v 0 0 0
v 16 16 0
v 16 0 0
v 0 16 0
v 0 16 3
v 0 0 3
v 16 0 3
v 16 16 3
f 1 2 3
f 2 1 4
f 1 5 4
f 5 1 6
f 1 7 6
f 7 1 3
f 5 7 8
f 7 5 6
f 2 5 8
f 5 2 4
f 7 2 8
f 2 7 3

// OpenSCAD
union() {
    translate([0, 0, 0]) color("brown") cube([1, 1, 1]);
    translate([0, 0, 1]) color("brown") cube([1, 1, 1]);
    translate([0, 0, 2]) color("brown") cube([1, 1, 1]);
    translate([0, 1, 0]) color("brown") cube([1, 1, 1]);
    translate([0, 1, 1]) color("brown") cube([1, 1, 1]);
    translate([0, 1, 2]) color("brown") cube([1, 1, 1]);
    translate([0, 2, 0]) color("brown") cube([1, 1, 1]);
    translate([0, 2, 1]) color("brown") cube([1, 1, 1]);
    translate([0, 2, 2]) color("brown") cube([1, 1, 1]);
    translate([0, 3, 0]) color("brown") cube([1, 1, 1]);
    translate([0, 3, 1]) color("brown") cube([1, 1, 1]);
    translate([0, 3, 2]) color("brown") cube([1, 1, 1]);
    translate([0, 4, 0]) color("brown") cube([1, 1, 1]);
    translate([0, 4, 1]) color("brown") cube([1, 1, 1]);
    translate([0, 4, 2]) color("brown") cube([1, 1, 1]);
    translate([0, 5, 0]) color("brown") cube([1, 1, 1]);
    translate([0, 5, 1]) color("brown") cube([1, 1, 1]);
    translate([0, 5, 2]) color("brown") cube([1, 1, 1]);
    translate([0, 6, 0]) color("brown") cube([1, 1, 1]);
    translate([0, 6, 1]) color("brown") cube([1, 1, 1]);
    translate([0, 6, 2]) color("brown") cube([1, 1, 1]);
    translate([0, 7, 0]) color("brown") cube([1, 1, 1]);
    translate([0, 7, 1]) color("brown") cube([1, 1, 1]);
    translate([0, 7, 2]) color("brown") cube([1, 1, 1]);
    translate([0, 8, 0]) color("brown") cube([1, 1, 1]);
    translate([0, 8, 1]) color("brown") cube([1, 1, 1]);
    translate([0, 8, 2]) color("brown") cube([1, 1, 1]);
    translate([0, 9, 0]) color("brown") cube([1, 1, 1]);
    translate([0, 9, 1]) color("brown") cube([1, 1, 1]);
    translate([0, 9, 2]) color("brown") cube([1, 1, 1]);
    translate([0, 10, 0]) color("brown") cube([1, 1, 1]);
    translate([0, 10, 1]) color("brown") cube([1, 1, 1]);
    translate([0, 10, 2]) color("brown") cube([1, 1, 1]);
    translate([0, 11, 0]) color("brown") cube([1, 1, 1]);
    translate([0, 11, 1]) color("brown") cube([1, 1, 1]);
    translate([0, 11, 2]) color("brown") cube([1, 1, 1]);
    translate([0, 12, 0]) color("brown") cube([1, 1, 1]);
    translate([0, 12, 1]) color("brown") cube([1, 1, 1]);
    translate([0, 12, 2]) color("brown") cube([1, 1, 1]);
    translate([0, 13, 0]) color("brown") cube([1, 1, 1]);
    translate([0, 13, 1]) color("brown") cube([1, 1, 1]);
    translate([0, 13, 2]) color("brown") cube([1, 1, 1]);
    translate([0, 14, 0]) color("brown") cube([1, 1, 1]);
    translate([0, 14, 1]) color("brown") cube([1, 1, 1]);
    translate([0, 14, 2]) color("brown") cube([1, 1, 1]);
    translate([0, 15, 0]) color("brown") cube([1, 1, 1]);
    translate([0, 15, 1]) color("brown") cube([1, 1, 1]);
    translate([0, 15, 2]) color("brown") cube([1, 1, 1]);
    translate([1, 0, 0]) color("brown") cube([1, 1, 1]);
    translate([1, 0, 1]) color("brown") cube([1, 1, 1]);
    translate([1, 0, 2]) color("brown") cube([1, 1, 1]);
    translate([1, 1, 0]) color("brown") cube([1, 1, 1]);
    translate([1, 1, 1]) color("brown") cube([1, 1, 1]);
    translate([1, 1, 2]) color("brown") cube([1, 1, 1]);
    translate([1, 2, 0]) color("brown") cube([1, 1, 1]);
    translate([1, 2, 1]) color("brown") cube([1, 1, 1]);
    translate([1, 2, 2]) color("brown") cube([1, 1, 1]);
    translate([1, 3, 0]) color("brown") cube([1, 1, 1]);
    translate([1, 3, 1]) color("brown") cube([1, 1, 1]);
    translate([1, 3, 2]) color("brown") cube([1, 1, 1]);
    translate([1, 4, 0]) color("brown") cube([1, 1, 1]);
    translate([1, 4, 1]) color("brown") cube([1, 1, 1]);
    translate([1, 4, 2]) color("brown") cube([1, 1, 1]);
    translate([1, 5, 0]) color("brown") cube([1, 1, 1]);
    translate([1, 5, 1]) color("brown") cube([1, 1, 1]);
    translate([1, 5, 2]) color("brown") cube([1, 1, 1]);
    translate([1, 6, 0]) color("brown") cube([1, 1, 1]);
    translate([1, 6, 1]) color("brown") cube([1, 1, 1]);
    translate([1, 6, 2]) color("brown") cube([1, 1, 1]);
    translate([1, 7, 0]) color("brown") cube([1, 1, 1]);
    translate([1, 7, 1]) color("brown") cube([1, 1, 1]);
    translate([1, 7, 2]) color("brown") cube([1, 1, 1]);
    translate([1, 8, 0]) color("brown") cube([1, 1, 1]);
    translate([1, 8, 1]) color("brown") cube([1, 1, 1]);
    translate([1, 8, 2]) color("brown") cube([1, 1, 1]);
    translate([1, 9, 0]) color("brown") cube([1, 1, 1]);
    translate([1, 9, 1]) color("brown") cube([1, 1, 1]);
    translate([1, 9, 2]) color("brown") cube([1, 1, 1]);
    translate([1, 10, 0]) color("brown") cube([1, 1, 1]);
    translate([1, 10, 1]) color("brown") cube([1, 1, 1]);
    translate([1, 10, 2]) color("brown") cube([1, 1, 1]);
    translate([1, 11, 0]) color("brown") cube([1, 1, 1]);
    translate([1, 11, 1]) color("brown") cube([1, 1, 1]);
    translate([1, 11, 2]) color("brown") cube([1, 1, 1]);
    translate([1, 12, 0]) color("brown") cube([1, 1, 1]);
    translate([1, 12, 1]) color("brown") cube([1, 1, 1]);
    translate([1, 12, 2]) color("brown") cube([1, 1, 1]);
    translate([1, 13, 0]) color("brown") cube([1, 1, 1]);
    translate([1, 13, 1]) color("brown") cube([1, 1, 1]);
    translate([1, 13, 2]) color("brown") cube([1, 1, 1]);
    translate([1, 14, 0]) color("brown") cube([1, 1, 1]);
    translate([1, 14, 1]) color("brown") cube([1, 1, 1]);
    translate([1, 14, 2]) color("brown") cube([1, 1, 1]);
    translate([1, 15, 0]) color("brown") cube([1, 1, 1]);
    translate([1, 15, 1]) color("brown") cube([1, 1, 1]);
    translate([1, 15, 2]) color("brown") cube([1, 1, 1]);
    translate([2, 0, 0]) color("brown") cube([1, 1, 1]);
    translate([2, 0, 1]) color("brown") cube([1, 1, 1]);
    translate([2, 0, 2]) color("brown") cube([1, 1, 1]);
    translate([2, 1, 0]) color("brown") cube([1, 1, 1]);
    translate([2, 1, 1]) color("brown") cube([1, 1, 1]);
    translate([2, 1, 2]) color("brown") cube([1, 1, 1]);
    translate([2, 2, 0]) color("brown") cube([1, 1, 1]);
    translate([2, 2, 1]) color("brown") cube([1, 1, 1]);
    translate([2, 2, 2]) color("brown") cube([1, 1, 1]);
    translate([2, 3, 0]) color("brown") cube([1, 1, 1]);
    translate([2, 3, 1]) color("brown") cube([1, 1, 1]);
    translate([2, 3, 2]) color("brown") cube([1, 1, 1]);
    translate([2, 4, 0]) color("brown") cube([1, 1, 1]);
    translate([2, 4, 1]) color("brown") cube([1, 1, 1]);
    translate([2, 4, 2]) color("brown") cube([1, 1, 1]);
    translate([2, 5, 0]) color("brown") cube([1, 1, 1]);
    translate([2, 5, 1]) color("brown") cube([1, 1, 1]);
    translate([2, 5, 2]) color("brown") cube([1, 1, 1]);
    translate([2, 6, 0]) color("brown") cube([1, 1, 1]);
    translate([2, 6, 1]) color("brown") cube([1, 1, 1]);
    translate([2, 6, 2]) color("brown") cube([1, 1, 1]);
    translate([2, 7, 0]) color("brown") cube([1, 1, 1]);
    translate([2, 7, 1]) color("brown") cube([1, 1, 1]);
    translate([2, 7, 2]) color("brown") cube([1, 1, 1]);
    translate([2, 8, 0]) color("brown") cube([1, 1, 1]);
    translate([2, 8, 1]) color("brown") cube([1, 1, 1]);
    translate([2, 8, 2]) color("brown") cube([1, 1, 1]);
    translate([2, 9, 0]) color("brown") cube([1, 1, 1]);
    translate([2, 9, 1]) color("brown") cube([1, 1, 1]);
    translate([2, 9, 2]) color("brown") cube([1, 1, 1]);
    translate([2, 10, 0]) color("brown") cube([1, 1, 1]);
    translate([2, 10, 1]) color("brown") cube([1, 1, 1]);
    translate([2, 10, 2]) color("brown") cube([1, 1, 1]);
    translate([2, 11, 0]) color("brown") cube([1, 1, 1]);
    translate([2, 11, 1]) color("brown") cube([1, 1, 1]);
    translate([2, 11, 2]) color("brown") cube([1, 1, 1]);
    translate([2, 12, 0]) color("brown") cube([1, 1, 1]);
    translate([2, 12, 1]) color("brown") cube([1, 1, 1]);
    translate([2, 12, 2]) color("brown") cube([1, 1, 1]);
    translate([2, 13, 0]) color("brown") cube([1, 1, 1]);
    translate([2, 13, 1]) color("brown") cube([1, 1, 1]);
    translate([2, 13, 2]) color("brown") cube([1, 1, 1]);
    translate([2, 14, 0]) color("brown") cube([1, 1, 1]);
    translate([2, 14, 1]) color("brown") cube([1, 1, 1]);
    translate([2, 14, 2]) color("brown") cube([1, 1, 1]);
    translate([2, 15, 0]) color("brown") cube([1, 1, 1]);
    translate([2, 15, 1]) color("brown") cube([1, 1, 1]);
    translate([2, 15, 2]) color("brown") cube([1, 1, 1]);
    translate([3, 0, 0]) color("brown") cube([1, 1, 1]);
    translate([3, 0, 1]) color("brown") cube([1, 1, 1]);
    translate([3, 0, 2]) color("brown") cube([1, 1, 1]);
    translate([3, 1, 0]) color("brown") cube([1, 1, 1]);
    translate([3, 1, 1]) color("brown") cube([1, 1, 1]);
    translate([3, 1, 2]) color("brown") cube([1, 1, 1]);
    translate([3, 2, 0]) color("brown") cube([1, 1, 1]);
    translate([3, 2, 1]) color("brown") cube([1, 1, 1]);
    translate([3, 2, 2]) color("brown") cube([1, 1, 1]);
    translate([3, 3, 0]) color("brown") cube([1, 1, 1]);
    translate([3, 3, 1]) color("brown") cube([1, 1, 1]);
    translate([3, 3, 2]) color("brown") cube([1, 1, 1]);
    translate([3, 4, 0]) color("brown") cube([1, 1, 1]);
    translate([3, 4, 1]) color("brown") cube([1, 1, 1]);
    translate([3, 4, 2]) color("brown") cube([1, 1, 1]);
    translate([3, 5, 0]) color("brown") cube([1, 1, 1]);
    translate([3, 5, 1]) color("brown") cube([1, 1, 1]);
    translate([3, 5, 2]) color("brown") cube([1, 1, 1]);
    translate([3, 6, 0]) color("brown") cube([1, 1, 1]);
    translate([3, 6, 1]) color("brown") cube([1, 1, 1]);
    translate([3, 6, 2]) color("brown") cube([1, 1, 1]);
    translate([3, 7, 0]) color("brown") cube([1, 1, 1]);
    translate([3, 7, 1]) color("brown") cube([1, 1, 1]);
    translate([3, 7, 2]) color("brown") cube([1, 1, 1]);
    translate([3, 8, 0]) color("brown") cube([1, 1, 1]);
    translate([3, 8, 1]) color("brown") cube([1, 1, 1]);
    translate([3, 8, 2]) color("brown") cube([1, 1, 1]);
    translate([3, 9, 0]) color("brown") cube([1, 1, 1]);
    translate([3, 9, 1]) color("brown") cube([1, 1, 1]);
    translate([3, 9, 2]) color("brown") cube([1, 1, 1]);
    translate([3, 10, 0]) color("brown") cube([1, 1, 1]);
    translate([3, 10, 1]) color("brown") cube([1, 1, 1]);
    translate([3, 10, 2]) color("brown") cube([1, 1, 1]);
    translate([3, 11, 0]) color("brown") cube([1, 1, 1]);
    translate([3, 11, 1]) color("brown") cube([1, 1, 1]);
    translate([3, 11, 2]) color("brown") cube([1, 1, 1]);
    translate([3, 12, 0]) color("brown") cube([1, 1, 1]);
    translate([3, 12, 1]) color("brown") cube([1, 1, 1]);
    translate([3, 12, 2]) color("brown") cube([1, 1, 1]);
    translate([3, 13, 0]) color("brown") cube([1, 1, 1]);
    translate([3, 13, 1]) color("brown") cube([1, 1, 1]);
    translate([3, 13, 2]) color("brown") cube([1, 1, 1]);
    translate([3, 14, 0]) color("brown") cube([1, 1, 1]);
    translate([3, 14, 1]) color("brown") cube([1, 1, 1]);
    translate([3, 14, 2]) color("brown") cube([1, 1, 1]);
    translate([3, 15, 0]) color("brown") cube([1, 1, 1]);
    translate([3, 15, 1]) color("brown") cube([1, 1, 1]);
    translate([3, 15, 2]) color("brown") cube([1, 1, 1]);
    translate([4, 0, 0]) color("brown") cube([1, 1, 1]);
    translate([4, 0, 1]) color("brown") cube([1, 1, 1]);
    translate([4, 0, 2]) color("brown") cube([1, 1, 1]);
    translate([4, 1, 0]) color("brown") cube([1, 1, 1]);
    translate([4, 1, 1]) color("brown") cube([1, 1, 1]);
    translate([4, 1, 2]) color("brown") cube([1, 1, 1]);
    translate([4, 2, 0]) color("brown") cube([1, 1, 1]);
    translate([4, 2, 1]) color("brown") cube([1, 1, 1]);
    translate([4, 2, 2]) color("brown") cube([1, 1, 1]);
    translate([4, 3, 0]) color("brown") cube([1, 1, 1]);
    translate([4, 3, 1]) color("brown") cube([1, 1, 1]);
    translate([4, 3, 2]) color("brown") cube([1, 1, 1]);
    translate([4, 4, 0]) color("brown") cube([1, 1, 1]);
    translate([4, 4, 1]) color("brown") cube([1, 1, 1]);
    translate([4, 4, 2]) color("blue") cube([1, 1, 1]);
    translate([4, 5, 0]) color("brown") cube([1, 1, 1]);
    translate([4, 5, 1]) color("brown") cube([1, 1, 1]);
    translate([4, 5, 2]) color("brown") cube([1, 1, 1]);
    translate([4, 6, 0]) color("brown") cube([1, 1, 1]);
    translate([4, 6, 1]) color("brown") cube([1, 1, 1]);
    translate([4, 6, 2]) color("brown") cube([1, 1, 1]);
    translate([4, 7, 0]) color("brown") cube([1, 1, 1]);
    translate([4, 7, 1]) color("brown") cube([1, 1, 1]);
    translate([4, 7, 2]) color("brown") cube([1, 1, 1]);
    translate([4, 8, 0]) color("brown") cube([1, 1, 1]);
    translate([4, 8, 1]) color("brown") cube([1, 1, 1]);
    translate([4, 8, 2]) color("brown") cube([1, 1, 1]);
    translate([4, 9, 0]) color("brown") cube([1, 1, 1]);
    translate([4, 9, 1]) color("brown") cube([1, 1, 1]);
    translate([4, 9, 2]) color("brown") cube([1, 1, 1]);
    translate([4, 10, 0]) color("brown") cube([1, 1, 1]);
    translate([4, 10, 1]) color("brown") cube([1, 1, 1]);
    translate([4, 10, 2]) color("brown") cube([1, 1, 1]);
    translate([4, 11, 0]) color("brown") cube([1, 1, 1]);
    translate([4, 11, 1]) color("brown") cube([1, 1, 1]);
    translate([4, 11, 2]) color("brown") cube([1, 1, 1]);
    translate([4, 12, 0]) color("brown") cube([1, 1, 1]);
    translate([4, 12, 1]) color("brown") cube([1, 1, 1]);
    translate([4, 12, 2]) color("brown") cube([1, 1, 1]);
    translate([4, 13, 0]) color("brown") cube([1, 1, 1]);
    translate([4, 13, 1]) color("brown") cube([1, 1, 1]);
    translate([4, 13, 2]) color("brown") cube([1, 1, 1]);
    translate([4, 14, 0]) color("brown") cube([1, 1, 1]);
    translate([4, 14, 1]) color("brown") cube([1, 1, 1]);
    translate([4, 14, 2]) color("brown") cube([1, 1, 1]);
    translate([4, 15, 0]) color("brown") cube([1, 1, 1]);
    translate([4, 15, 1]) color("brown") cube([1, 1, 1]);
    translate([4, 15, 2]) color("brown") cube([1, 1, 1]);
    translate([5, 0, 0]) color("brown") cube([1, 1, 1]);
    translate([5, 0, 1]) color("brown") cube([1, 1, 1]);
    translate([5, 0, 2]) color("brown") cube([1, 1, 1]);
    translate([5, 1, 0]) color("brown") cube([1, 1, 1]);
    translate([5, 1, 1]) color("brown") cube([1, 1, 1]);
    translate([5, 1, 2]) color("brown") cube([1, 1, 1]);
    translate([5, 2, 0]) color("brown") cube([1, 1, 1]);
    translate([5, 2, 1]) color("brown") cube([1, 1, 1]);
    translate([5, 2, 2]) color("brown") cube([1, 1, 1]);
    translate([5, 3, 0]) color("brown") cube([1, 1, 1]);
    translate([5, 3, 1]) color("brown") cube([1, 1, 1]);
    translate([5, 3, 2]) color("brown") cube([1, 1, 1]);
    translate([5, 4, 0]) color("brown") cube([1, 1, 1]);
    translate([5, 4, 1]) color("brown") cube([1, 1, 1]);
    translate([5, 4, 2]) color("brown") cube([1, 1, 1]);
    translate([5, 5, 0]) color("brown") cube([1, 1, 1]);
    translate([5, 5, 1]) color("brown") cube([1, 1, 1]);
    translate([5, 5, 2]) color("brown") cube([1, 1, 1]);
    translate([5, 6, 0]) color("brown") cube([1, 1, 1]);
    translate([5, 6, 1]) color("brown") cube([1, 1, 1]);
    translate([5, 6, 2]) color("brown") cube([1, 1, 1]);
    translate([5, 7, 0]) color("brown") cube([1, 1, 1]);
    translate([5, 7, 1]) color("brown") cube([1, 1, 1]);
    translate([5, 7, 2]) color("brown") cube([1, 1, 1]);
    translate([5, 8, 0]) color("brown") cube([1, 1, 1]);
    translate([5, 8, 1]) color("brown") cube([1, 1, 1]);
    translate([5, 8, 2]) color("brown") cube([1, 1, 1]);
    translate([5, 9, 0]) color("brown") cube([1, 1, 1]);
    translate([5, 9, 1]) color("brown") cube([1, 1, 1]);
    translate([5, 9, 2]) color("brown") cube([1, 1, 1]);
    translate([5, 10, 0]) color("brown") cube([1, 1, 1]);
    translate([5, 10, 1]) color("brown") cube([1, 1, 1]);
    translate([5, 10, 2]) color("brown") cube([1, 1, 1]);
    translate([5, 11, 0]) color("brown") cube([1, 1, 1]);
    translate([5, 11, 1]) color("brown") cube([1, 1, 1]);
    translate([5, 11, 2]) color("brown") cube([1, 1, 1]);
    translate([5, 12, 0]) color("brown") cube([1, 1, 1]);
    translate([5, 12, 1]) color("brown") cube([1, 1, 1]);
    translate([5, 12, 2]) color("brown") cube([1, 1, 1]);
    translate([5, 13, 0]) color("brown") cube([1, 1, 1]);
    translate([5, 13, 1]) color("brown") cube([1, 1, 1]);
    translate([5, 13, 2]) color("brown") cube([1, 1, 1]);
    translate([5, 14, 0]) color("brown") cube([1, 1, 1]);
    translate([5, 14, 1]) color("brown") cube([1, 1, 1]);
    translate([5, 14, 2]) color("brown") cube([1, 1, 1]);
    translate([5, 15, 0]) color("brown") cube([1, 1, 1]);
    translate([5, 15, 1]) color("brown") cube([1, 1, 1]);
    translate([5, 15, 2]) color("brown") cube([1, 1, 1]);
    translate([6, 0, 0]) color("brown") cube([1, 1, 1]);
    translate([6, 0, 1]) color("brown") cube([1, 1, 1]);
    translate([6, 0, 2]) color("brown") cube([1, 1, 1]);
    translate([6, 1, 0]) color("brown") cube([1, 1, 1]);
    translate([6, 1, 1]) color("brown") cube([1, 1, 1]);
    translate([6, 1, 2]) color("brown") cube([1, 1, 1]);
    translate([6, 2, 0]) color("brown") cube([1, 1, 1]);
    translate([6, 2, 1]) color("brown") cube([1, 1, 1]);
    translate([6, 2, 2]) color("brown") cube([1, 1, 1]);
    translate([6, 3, 0]) color("brown") cube([1, 1, 1]);
    translate([6, 3, 1]) color("brown") cube([1, 1, 1]);
    translate([6, 3, 2]) color("brown") cube([1, 1, 1]);
    translate([6, 4, 0]) color("brown") cube([1, 1, 1]);
    translate([6, 4, 1]) color("brown") cube([1, 1, 1]);
    translate([6, 4, 2]) color("brown") cube([1, 1, 1]);
    translate([6, 5, 0]) color("brown") cube([1, 1, 1]);
    translate([6, 5, 1]) color("brown") cube([1, 1, 1]);
    translate([6, 5, 2]) color("brown") cube([1, 1, 1]);
    translate([6, 6, 0]) color("brown") cube([1, 1, 1]);
    translate([6, 6, 1]) color("brown") cube([1, 1, 1]);
    translate([6, 6, 2]) color("brown") cube([1, 1, 1]);
    translate([6, 7, 0]) color("brown") cube([1, 1, 1]);
    translate([6, 7, 1]) color("brown") cube([1, 1, 1]);
    translate([6, 7, 2]) color("brown") cube([1, 1, 1]);
    translate([6, 8, 0]) color("brown") cube([1, 1, 1]);
    translate([6, 8, 1]) color("brown") cube([1, 1, 1]);
    translate([6, 8, 2]) color("brown") cube([1, 1, 1]);
    translate([6, 9, 0]) color("brown") cube([1, 1, 1]);
    translate([6, 9, 1]) color("brown") cube([1, 1, 1]);
    translate([6, 9, 2]) color("brown") cube([1, 1, 1]);
    translate([6, 10, 0]) color("brown") cube([1, 1, 1]);
    translate([6, 10, 1]) color("brown") cube([1, 1, 1]);
    translate([6, 10, 2]) color("brown") cube([1, 1, 1]);
    translate([6, 11, 0]) color("brown") cube([1, 1, 1]);
    translate([6, 11, 1]) color("brown") cube([1, 1, 1]);
    translate([6, 11, 2]) color("brown") cube([1, 1, 1]);
    translate([6, 12, 0]) color("brown") cube([1, 1, 1]);
    translate([6, 12, 1]) color("brown") cube([1, 1, 1]);
    translate([6, 12, 2]) color("brown") cube([1, 1, 1]);
    translate([6, 13, 0]) color("brown") cube([1, 1, 1]);
    translate([6, 13, 1]) color("brown") cube([1, 1, 1]);
    translate([6, 13, 2]) color("brown") cube([1, 1, 1]);
    translate([6, 14, 0]) color("brown") cube([1, 1, 1]);
    translate([6, 14, 1]) color("brown") cube([1, 1, 1]);
    translate([6, 14, 2]) color("brown") cube([1, 1, 1]);
    translate([6, 15, 0]) color("brown") cube([1, 1, 1]);
    translate([6, 15, 1]) color("brown") cube([1, 1, 1]);
    translate([6, 15, 2]) color("brown") cube([1, 1, 1]);
    translate([7, 0, 0]) color("brown") cube([1, 1, 1]);
    translate([7, 0, 1]) color("brown") cube([1, 1, 1]);
    translate([7, 0, 2]) color("brown") cube([1, 1, 1]);
    translate([7, 1, 0]) color("brown") cube([1, 1, 1]);
    translate([7, 1, 1]) color("brown") cube([1, 1, 1]);
    translate([7, 1, 2]) color("brown") cube([1, 1, 1]);
    translate([7, 2, 0]) color("brown") cube([1, 1, 1]);
    translate([7, 2, 1]) color("brown") cube([1, 1, 1]);
    translate([7, 2, 2]) color("brown") cube([1, 1, 1]);
    translate([7, 3, 0]) color("brown") cube([1, 1, 1]);
    translate([7, 3, 1]) color("brown") cube([1, 1, 1]);
    translate([7, 3, 2]) color("brown") cube([1, 1, 1]);
    translate([7, 4, 0]) color("brown") cube([1, 1, 1]);
    translate([7, 4, 1]) color("brown") cube([1, 1, 1]);
    translate([7, 4, 2]) color("brown") cube([1, 1, 1]);
    translate([7, 5, 0]) color("brown") cube([1, 1, 1]);
    translate([7, 5, 1]) color("brown") cube([1, 1, 1]);
    translate([7, 5, 2]) color("brown") cube([1, 1, 1]);
    translate([7, 6, 0]) color("brown") cube([1, 1, 1]);
    translate([7, 6, 1]) color("brown") cube([1, 1, 1]);
    translate([7, 6, 2]) color("brown") cube([1, 1, 1]);
    translate([7, 7, 0]) color("brown") cube([1, 1, 1]);
    translate([7, 7, 1]) color("brown") cube([1, 1, 1]);
    translate([7, 7, 2]) color("brown") cube([1, 1, 1]);
    translate([7, 8, 0]) color("brown") cube([1, 1, 1]);
    translate([7, 8, 1]) color("brown") cube([1, 1, 1]);
    translate([7, 8, 2]) color("brown") cube([1, 1, 1]);
    translate([7, 9, 0]) color("brown") cube([1, 1, 1]);
    translate([7, 9, 1]) color("brown") cube([1, 1, 1]);
    translate([7, 9, 2]) color("brown") cube([1, 1, 1]);
    translate([7, 10, 0]) color("brown") cube([1, 1, 1]);
    translate([7, 10, 1]) color("brown") cube([1, 1, 1]);
    translate([7, 10, 2]) color("brown") cube([1, 1, 1]);
    translate([7, 11, 0]) color("brown") cube([1, 1, 1]);
    translate([7, 11, 1]) color("brown") cube([1, 1, 1]);
    translate([7, 11, 2]) color("brown") cube([1, 1, 1]);
    translate([7, 12, 0]) color("brown") cube([1, 1, 1]);
    translate([7, 12, 1]) color("brown") cube([1, 1, 1]);
    translate([7, 12, 2]) color("brown") cube([1, 1, 1]);
    translate([7, 13, 0]) color("brown") cube([1, 1, 1]);
    translate([7, 13, 1]) color("brown") cube([1, 1, 1]);
    translate([7, 13, 2]) color("brown") cube([1, 1, 1]);
    translate([7, 14, 0]) color("brown") cube([1, 1, 1]);
    translate([7, 14, 1]) color("brown") cube([1, 1, 1]);
    translate([7, 14, 2]) color("brown") cube([1, 1, 1]);
    translate([7, 15, 0]) color("brown") cube([1, 1, 1]);
    translate([7, 15, 1]) color("brown") cube([1, 1, 1]);
    translate([7, 15, 2]) color("brown") cube([1, 1, 1]);
    translate([8, 0, 0]) color("brown") cube([1, 1, 1]);
    translate([8, 0, 1]) color("brown") cube([1, 1, 1]);
    translate([8, 0, 2]) color("brown") cube([1, 1, 1]);
    translate([8, 1, 0]) color("brown") cube([1, 1, 1]);
    translate([8, 1, 1]) color("brown") cube([1, 1, 1]);
    translate([8, 1, 2]) color("brown") cube([1, 1, 1]);
    translate([8, 2, 0]) color("brown") cube([1, 1, 1]);
    translate([8, 2, 1]) color("brown") cube([1, 1, 1]);
    translate([8, 2, 2]) color("brown") cube([1, 1, 1]);
    translate([8, 3, 0]) color("brown") cube([1, 1, 1]);
    translate([8, 3, 1]) color("brown") cube([1, 1, 1]);
    translate([8, 3, 2]) color("brown") cube([1, 1, 1]);
    translate([8, 4, 0]) color("brown") cube([1, 1, 1]);
    translate([8, 4, 1]) color("brown") cube([1, 1, 1]);
    translate([8, 4, 2]) color("brown") cube([1, 1, 1]);
    translate([8, 5, 0]) color("brown") cube([1, 1, 1]);
    translate([8, 5, 1]) color("brown") cube([1, 1, 1]);
    translate([8, 5, 2]) color("brown") cube([1, 1, 1]);
    translate([8, 6, 0]) color("brown") cube([1, 1, 1]);
    translate([8, 6, 1]) color("brown") cube([1, 1, 1]);
    translate([8, 6, 2]) color("brown") cube([1, 1, 1]);
    translate([8, 7, 0]) color("brown") cube([1, 1, 1]);
    translate([8, 7, 1]) color("brown") cube([1, 1, 1]);
    translate([8, 7, 2]) color("brown") cube([1, 1, 1]);
    translate([8, 8, 0]) color("brown") cube([1, 1, 1]);
    translate([8, 8, 1]) color("brown") cube([1, 1, 1]);
    translate([8, 8, 2]) color("brown") cube([1, 1, 1]);
    translate([8, 9, 0]) color("brown") cube([1, 1, 1]);
    translate([8, 9, 1]) color("brown") cube([1, 1, 1]);
    translate([8, 9, 2]) color("brown") cube([1, 1, 1]);
    translate([8, 10, 0]) color("brown") cube([1, 1, 1]);
    translate([8, 10, 1]) color("brown") cube([1, 1, 1]);
    translate([8, 10, 2]) color("brown") cube([1, 1, 1]);
    translate([8, 11, 0]) color("brown") cube([1, 1, 1]);
    translate([8, 11, 1]) color("brown") cube([1, 1, 1]);
    translate([8, 11, 2]) color("brown") cube([1, 1, 1]);
    translate([8, 12, 0]) color("brown") cube([1, 1, 1]);
    translate([8, 12, 1]) color("brown") cube([1, 1, 1]);
    translate([8, 12, 2]) color("brown") cube([1, 1, 1]);
    translate([8, 13, 0]) color("brown") cube([1, 1, 1]);
    translate([8, 13, 1]) color("brown") cube([1, 1, 1]);
    translate([8, 13, 2]) color("brown") cube([1, 1, 1]);
    translate([8, 14, 0]) color("brown") cube([1, 1, 1]);
    translate([8, 14, 1]) color("brown") cube([1, 1, 1]);
    translate([8, 14, 2]) color("brown") cube([1, 1, 1]);
    translate([8, 15, 0]) color("brown") cube([1, 1, 1]);
    translate([8, 15, 1]) color("brown") cube([1, 1, 1]);
    translate([8, 15, 2]) color("brown") cube([1, 1, 1]);
    translate([9, 0, 0]) color("brown") cube([1, 1, 1]);
    translate([9, 0, 1]) color("brown") cube([1, 1, 1]);
    translate([9, 0, 2]) color("brown") cube([1, 1, 1]);
    translate([9, 1, 0]) color("brown") cube([1, 1, 1]);
    translate([9, 1, 1]) color("brown") cube([1, 1, 1]);
    translate([9, 1, 2]) color("brown") cube([1, 1, 1]);
    translate([9, 2, 0]) color("brown") cube([1, 1, 1]);
    translate([9, 2, 1]) color("brown") cube([1, 1, 1]);
    translate([9, 2, 2]) color("brown") cube([1, 1, 1]);
    translate([9, 3, 0]) color("brown") cube([1, 1, 1]);
    translate([9, 3, 1]) color("brown") cube([1, 1, 1]);
    translate([9, 3, 2]) color("brown") cube([1, 1, 1]);
    translate([9, 4, 0]) color("brown") cube([1, 1, 1]);
    translate([9, 4, 1]) color("brown") cube([1, 1, 1]);
    translate([9, 4, 2]) color("brown") cube([1, 1, 1]);
    translate([9, 5, 0]) color("brown") cube([1, 1, 1]);
    translate([9, 5, 1]) color("brown") cube([1, 1, 1]);
    translate([9, 5, 2]) color("brown") cube([1, 1, 1]);
    translate([9, 6, 0]) color("brown") cube([1, 1, 1]);
    translate([9, 6, 1]) color("brown") cube([1, 1, 1]);
    translate([9, 6, 2]) color("brown") cube([1, 1, 1]);
    translate([9, 7, 0]) color("brown") cube([1, 1, 1]);
    translate([9, 7, 1]) color("brown") cube([1, 1, 1]);
    translate([9, 7, 2]) color("brown") cube([1, 1, 1]);
    translate([9, 8, 0]) color("brown") cube([1, 1, 1]);
    translate([9, 8, 1]) color("brown") cube([1, 1, 1]);
    translate([9, 8, 2]) color("brown") cube([1, 1, 1]);
    translate([9, 9, 0]) color("brown") cube([1, 1, 1]);
    translate([9, 9, 1]) color("brown") cube([1, 1, 1]);
    translate([9, 9, 2]) color("brown") cube([1, 1, 1]);
    translate([9, 10, 0]) color("brown") cube([1, 1, 1]);
    translate([9, 10, 1]) color("brown") cube([1, 1, 1]);
    translate([9, 10, 2]) color("brown") cube([1, 1, 1]);
    translate([9, 11, 0]) color("brown") cube([1, 1, 1]);
    translate([9, 11, 1]) color("brown") cube([1, 1, 1]);
    translate([9, 11, 2]) color("brown") cube([1, 1, 1]);
    translate([9, 12, 0]) color("brown") cube([1, 1, 1]);
    translate([9, 12, 1]) color("brown") cube([1, 1, 1]);
    translate([9, 12, 2]) color("brown") cube([1, 1, 1]);
    translate([9, 13, 0]) color("brown") cube([1, 1, 1]);
    translate([9, 13, 1]) color("brown") cube([1, 1, 1]);
    translate([9, 13, 2]) color("brown") cube([1, 1, 1]);
    translate([9, 14, 0]) color("brown") cube([1, 1, 1]);
    translate([9, 14, 1]) color("brown") cube([1, 1, 1]);
    translate([9, 14, 2]) color("brown") cube([1, 1, 1]);
    translate([9, 15, 0]) color("brown") cube([1, 1, 1]);
    translate([9, 15, 1]) color("brown") cube([1, 1, 1]);
    translate([9, 15, 2]) color("brown") cube([1, 1, 1]);
    translate([10, 0, 0]) color("brown") cube([1, 1, 1]);
    translate([10, 0, 1]) color("brown") cube([1, 1, 1]);
    translate([10, 0, 2]) color("brown") cube([1, 1, 1]);
    translate([10, 1, 0]) color("brown") cube([1, 1, 1]);
    translate([10, 1, 1]) color("brown") cube([1, 1, 1]);
    translate([10, 1, 2]) color("brown") cube([1, 1, 1]);
    translate([10, 2, 0]) color("brown") cube([1, 1, 1]);
    translate([10, 2, 1]) color("brown") cube([1, 1, 1]);
    translate([10, 2, 2]) color("brown") cube([1, 1, 1]);
    translate([10, 3, 0]) color("brown") cube([1, 1, 1]);
    translate([10, 3, 1]) color("brown") cube([1, 1, 1]);
    translate([10, 3, 2]) color("brown") cube([1, 1, 1]);
    translate([10, 4, 0]) color("brown") cube([1, 1, 1]);
    translate([10, 4, 1]) color("brown") cube([1, 1, 1]);
    translate([10, 4, 2]) color("brown") cube([1, 1, 1]);
    translate([10, 5, 0]) color("brown") cube([1, 1, 1]);
    translate([10, 5, 1]) color("brown") cube([1, 1, 1]);
    translate([10, 5, 2]) color("brown") cube([1, 1, 1]);
    translate([10, 6, 0]) color("brown") cube([1, 1, 1]);
    translate([10, 6, 1]) color("brown") cube([1, 1, 1]);
    translate([10, 6, 2]) color("brown") cube([1, 1, 1]);
    translate([10, 7, 0]) color("brown") cube([1, 1, 1]);
    translate([10, 7, 1]) color("brown") cube([1, 1, 1]);
    translate([10, 7, 2]) color("brown") cube([1, 1, 1]);
    translate([10, 8, 0]) color("brown") cube([1, 1, 1]);
    translate([10, 8, 1]) color("brown") cube([1, 1, 1]);
    translate([10, 8, 2]) color("brown") cube([1, 1, 1]);
    translate([10, 9, 0]) color("brown") cube([1, 1, 1]);
    translate([10, 9, 1]) color("brown") cube([1, 1, 1]);
    translate([10, 9, 2]) color("brown") cube([1, 1, 1]);
    translate([10, 10, 0]) color("brown") cube([1, 1, 1]);
    translate([10, 10, 1]) color("brown") cube([1, 1, 1]);
    translate([10, 10, 2]) color("brown") cube([1, 1, 1]);
    translate([10, 11, 0]) color("brown") cube([1, 1, 1]);
    translate([10, 11, 1]) color("brown") cube([1, 1, 1]);
    translate([10, 11, 2]) color("brown") cube([1, 1, 1]);
    translate([10, 12, 0]) color("brown") cube([1, 1, 1]);
    translate([10, 12, 1]) color("brown") cube([1, 1, 1]);
    translate([10, 12, 2]) color("brown") cube([1, 1, 1]);
    translate([10, 13, 0]) color("brown") cube([1, 1, 1]);
    translate([10, 13, 1]) color("brown") cube([1, 1, 1]);
    translate([10, 13, 2]) color("brown") cube([1, 1, 1]);
    translate([10, 14, 0]) color("brown") cube([1, 1, 1]);
    translate([10, 14, 1]) color("brown") cube([1, 1, 1]);
    translate([10, 14, 2]) color("brown") cube([1, 1, 1]);
    translate([10, 15, 0]) color("brown") cube([1, 1, 1]);
    translate([10, 15, 1]) color("brown") cube([1, 1, 1]);
    translate([10, 15, 2]) color("brown") cube([1, 1, 1]);
    translate([11, 0, 0]) color("brown") cube([1, 1, 1]);
    translate([11, 0, 1]) color("brown") cube([1, 1, 1]);
    translate([11, 0, 2]) color("brown") cube([1, 1, 1]);
    translate([11, 1, 0]) color("brown") cube([1, 1, 1]);
    translate([11, 1, 1]) color("brown") cube([1, 1, 1]);
    translate([11, 1, 2]) color("brown") cube([1, 1, 1]);
    translate([11, 2, 0]) color("brown") cube([1, 1, 1]);
    translate([11, 2, 1]) color("brown") cube([1, 1, 1]);
    translate([11, 2, 2]) color("brown") cube([1, 1, 1]);
    translate([11, 3, 0]) color("brown") cube([1, 1, 1]);
    translate([11, 3, 1]) color("brown") cube([1, 1, 1]);
    translate([11, 3, 2]) color("brown") cube([1, 1, 1]);
    translate([11, 4, 0]) color("brown") cube([1, 1, 1]);
    translate([11, 4, 1]) color("brown") cube([1, 1, 1]);
    translate([11, 4, 2]) color("brown") cube([1, 1, 1]);
    translate([11, 5, 0]) color("brown") cube([1, 1, 1]);
    translate([11, 5, 1]) color("brown") cube([1, 1, 1]);
    translate([11, 5, 2]) color("brown") cube([1, 1, 1]);
    translate([11, 6, 0]) color("brown") cube([1, 1, 1]);
    translate([11, 6, 1]) color("brown") cube([1, 1, 1]);
    translate([11, 6, 2]) color("brown") cube([1, 1, 1]);
    translate([11, 7, 0]) color("brown") cube([1, 1, 1]);
    translate([11, 7, 1]) color("brown") cube([1, 1, 1]);
    translate([11, 7, 2]) color("brown") cube([1, 1, 1]);
    translate([11, 8, 0]) color("brown") cube([1, 1, 1]);
    translate([11, 8, 1]) color("brown") cube([1, 1, 1]);
    translate([11, 8, 2]) color("brown") cube([1, 1, 1]);
    translate([11, 9, 0]) color("brown") cube([1, 1, 1]);
    translate([11, 9, 1]) color("brown") cube([1, 1, 1]);
    translate([11, 9, 2]) color("brown") cube([1, 1, 1]);
    translate([11, 10, 0]) color("brown") cube([1, 1, 1]);
    translate([11, 10, 1]) color("brown") cube([1, 1, 1]);
    translate([11, 10, 2]) color("brown") cube([1, 1, 1]);
    translate([11, 11, 0]) color("brown") cube([1, 1, 1]);
    translate([11, 11, 1]) color("brown") cube([1, 1, 1]);
    translate([11, 11, 2]) color("brown") cube([1, 1, 1]);
    translate([11, 12, 0]) color("brown") cube([1, 1, 1]);
    translate([11, 12, 1]) color("brown") cube([1, 1, 1]);
    translate([11, 12, 2]) color("brown") cube([1, 1, 1]);
    translate([11, 13, 0]) color("brown") cube([1, 1, 1]);
    translate([11, 13, 1]) color("brown") cube([1, 1, 1]);
    translate([11, 13, 2]) color("brown") cube([1, 1, 1]);
    translate([11, 14, 0]) color("brown") cube([1, 1, 1]);
    translate([11, 14, 1]) color("brown") cube([1, 1, 1]);
    translate([11, 14, 2]) color("brown") cube([1, 1, 1]);
    translate([11, 15, 0]) color("brown") cube([1, 1, 1]);
    translate([11, 15, 1]) color("brown") cube([1, 1, 1]);
    translate([11, 15, 2]) color("brown") cube([1, 1, 1]);
    translate([12, 0, 0]) color("brown") cube([1, 1, 1]);
    translate([12, 0, 1]) color("brown") cube([1, 1, 1]);
    translate([12, 0, 2]) color("brown") cube([1, 1, 1]);
    translate([12, 1, 0]) color("brown") cube([1, 1, 1]);
    translate([12, 1, 1]) color("brown") cube([1, 1, 1]);
    translate([12, 1, 2]) color("brown") cube([1, 1, 1]);
    translate([12, 2, 0]) color("brown") cube([1, 1, 1]);
    translate([12, 2, 1]) color("brown") cube([1, 1, 1]);
    translate([12, 2, 2]) color("brown") cube([1, 1, 1]);
    translate([12, 3, 0]) color("brown") cube([1, 1, 1]);
    translate([12, 3, 1]) color("brown") cube([1, 1, 1]);
    translate([12, 3, 2]) color("brown") cube([1, 1, 1]);
    translate([12, 4, 0]) color("brown") cube([1, 1, 1]);
    translate([12, 4, 1]) color("brown") cube([1, 1, 1]);
    translate([12, 4, 2]) color("brown") cube([1, 1, 1]);
    translate([12, 5, 0]) color("brown") cube([1, 1, 1]);
    translate([12, 5, 1]) color("brown") cube([1, 1, 1]);
    translate([12, 5, 2]) color("brown") cube([1, 1, 1]);
    translate([12, 6, 0]) color("brown") cube([1, 1, 1]);
    translate([12, 6, 1]) color("brown") cube([1, 1, 1]);
    translate([12, 6, 2]) color("brown") cube([1, 1, 1]);
    translate([12, 7, 0]) color("brown") cube([1, 1, 1]);
    translate([12, 7, 1]) color("brown") cube([1, 1, 1]);
    translate([12, 7, 2]) color("brown") cube([1, 1, 1]);
    translate([12, 8, 0]) color("brown") cube([1, 1, 1]);
    translate([12, 8, 1]) color("brown") cube([1, 1, 1]);
    translate([12, 8, 2]) color("brown") cube([1, 1, 1]);
    translate([12, 9, 0]) color("brown") cube([1, 1, 1]);
    translate([12, 9, 1]) color("brown") cube([1, 1, 1]);
    translate([12, 9, 2]) color("brown") cube([1, 1, 1]);
    translate([12, 10, 0]) color("brown") cube([1, 1, 1]);
    translate([12, 10, 1]) color("brown") cube([1, 1, 1]);
    translate([12, 10, 2]) color("brown") cube([1, 1, 1]);
    translate([12, 11, 0]) color("brown") cube([1, 1, 1]);
    translate([12, 11, 1]) color("brown") cube([1, 1, 1]);
    translate([12, 11, 2]) color("brown") cube([1, 1, 1]);
    translate([12, 12, 0]) color("brown") cube([1, 1, 1]);
    translate([12, 12, 1]) color("brown") cube([1, 1, 1]);
    translate([12, 12, 2]) color("brown") cube([1, 1, 1]);
    translate([12, 13, 0]) color("brown") cube([1, 1, 1]);
    translate([12, 13, 1]) color("brown") cube([1, 1, 1]);
    translate([12, 13, 2]) color("brown") cube([1, 1, 1]);
    translate([12, 14, 0]) color("brown") cube([1, 1, 1]);
    translate([12, 14, 1]) color("brown") cube([1, 1, 1]);
    translate([12, 14, 2]) color("brown") cube([1, 1, 1]);
    translate([12, 15, 0]) color("brown") cube([1, 1, 1]);
    translate([12, 15, 1]) color("brown") cube([1, 1, 1]);
    translate([12, 15, 2]) color("brown") cube([1, 1, 1]);
    translate([13, 0, 0]) color("brown") cube([1, 1, 1]);
    translate([13, 0, 1]) color("brown") cube([1, 1, 1]);
    translate([13, 0, 2]) color("brown") cube([1, 1, 1]);
    translate([13, 1, 0]) color("brown") cube([1, 1, 1]);
    translate([13, 1, 1]) color("brown") cube([1, 1, 1]);
    translate([13, 1, 2]) color("brown") cube([1, 1, 1]);
    translate([13, 2, 0]) color("brown") cube([1, 1, 1]);
    translate([13, 2, 1]) color("brown") cube([1, 1, 1]);
    translate([13, 2, 2]) color("brown") cube([1, 1, 1]);
    translate([13, 3, 0]) color("brown") cube([1, 1, 1]);
    translate([13, 3, 1]) color("brown") cube([1, 1, 1]);
    translate([13, 3, 2]) color("brown") cube([1, 1, 1]);
    translate([13, 4, 0]) color("brown") cube([1, 1, 1]);
    translate([13, 4, 1]) color("brown") cube([1, 1, 1]);
    translate([13, 4, 2]) color("brown") cube([1, 1, 1]);
    translate([13, 5, 0]) color("brown") cube([1, 1, 1]);
    translate([13, 5, 1]) color("brown") cube([1, 1, 1]);
    translate([13, 5, 2]) color("brown") cube([1, 1, 1]);
    translate([13, 6, 0]) color("brown") cube([1, 1, 1]);
    translate([13, 6, 1]) color("brown") cube([1, 1, 1]);
    translate([13, 6, 2]) color("brown") cube([1, 1, 1]);
    translate([13, 7, 0]) color("brown") cube([1, 1, 1]);
    translate([13, 7, 1]) color("brown") cube([1, 1, 1]);
    translate([13, 7, 2]) color("brown") cube([1, 1, 1]);
    translate([13, 8, 0]) color("brown") cube([1, 1, 1]);
    translate([13, 8, 1]) color("brown") cube([1, 1, 1]);
    translate([13, 8, 2]) color("brown") cube([1, 1, 1]);
    translate([13, 9, 0]) color("brown") cube([1, 1, 1]);
    translate([13, 9, 1]) color("brown") cube([1, 1, 1]);
    translate([13, 9, 2]) color("brown") cube([1, 1, 1]);
    translate([13, 10, 0]) color("brown") cube([1, 1, 1]);
    translate([13, 10, 1]) color("brown") cube([1, 1, 1]);
    translate([13, 10, 2]) color("brown") cube([1, 1, 1]);
    translate([13, 11, 0]) color("brown") cube([1, 1, 1]);
    translate([13, 11, 1]) color("brown") cube([1, 1, 1]);
    translate([13, 11, 2]) color("brown") cube([1, 1, 1]);
    translate([13, 12, 0]) color("brown") cube([1, 1, 1]);
    translate([13, 12, 1]) color("brown") cube([1, 1, 1]);
    translate([13, 12, 2]) color("brown") cube([1, 1, 1]);
    translate([13, 13, 0]) color("brown") cube([1, 1, 1]);
    translate([13, 13, 1]) color("brown") cube([1, 1, 1]);
    translate([13, 13, 2]) color("brown") cube([1, 1, 1]);
    translate([13, 14, 0]) color("brown") cube([1, 1, 1]);
    translate([13, 14, 1]) color("brown") cube([1, 1, 1]);
    translate([13, 14, 2]) color("brown") cube([1, 1, 1]);
    translate([13, 15, 0]) color("brown") cube([1, 1, 1]);
    translate([13, 15, 1]) color("brown") cube([1, 1, 1]);
    translate([13, 15, 2]) color("brown") cube([1, 1, 1]);
    translate([14, 0, 0]) color("brown") cube([1, 1, 1]);
    translate([14, 0, 1]) color("brown") cube([1, 1, 1]);
    translate([14, 0, 2]) color("brown") cube([1, 1, 1]);
    translate([14, 1, 0]) color("brown") cube([1, 1, 1]);
    translate([14, 1, 1]) color("brown") cube([1, 1, 1]);
    translate([14, 1, 2]) color("brown") cube([1, 1, 1]);
    translate([14, 2, 0]) color("brown") cube([1, 1, 1]);
    translate([14, 2, 1]) color("brown") cube([1, 1, 1]);
    translate([14, 2, 2]) color("brown") cube([1, 1, 1]);
    translate([14, 3, 0]) color("brown") cube([1, 1, 1]);
    translate([14, 3, 1]) color("brown") cube([1, 1, 1]);
    translate([14, 3, 2]) color("brown") cube([1, 1, 1]);
    translate([14, 4, 0]) color("brown") cube([1, 1, 1]);
    translate([14, 4, 1]) color("brown") cube([1, 1, 1]);
    translate([14, 4, 2]) color("brown") cube([1, 1, 1]);
    translate([14, 5, 0]) color("brown") cube([1, 1, 1]);
    translate([14, 5, 1]) color("brown") cube([1, 1, 1]);
    translate([14, 5, 2]) color("brown") cube([1, 1, 1]);
    translate([14, 6, 0]) color("brown") cube([1, 1, 1]);
    translate([14, 6, 1]) color("brown") cube([1, 1, 1]);
    translate([14, 6, 2]) color("brown") cube([1, 1, 1]);
    translate([14, 7, 0]) color("brown") cube([1, 1, 1]);
    translate([14, 7, 1]) color("brown") cube([1, 1, 1]);
    translate([14, 7, 2]) color("brown") cube([1, 1, 1]);
    translate([14, 8, 0]) color("brown") cube([1, 1, 1]);
    translate([14, 8, 1]) color("brown") cube([1, 1, 1]);
    translate([14, 8, 2]) color("brown") cube([1, 1, 1]);
    translate([14, 9, 0]) color("brown") cube([1, 1, 1]);
    translate([14, 9, 1]) color("brown") cube([1, 1, 1]);
    translate([14, 9, 2]) color("brown") cube([1, 1, 1]);
    translate([14, 10, 0]) color("brown") cube([1, 1, 1]);
    translate([14, 10, 1]) color("brown") cube([1, 1, 1]);
    translate([14, 10, 2]) color("brown") cube([1, 1, 1]);
    translate([14, 11, 0]) color("brown") cube([1, 1, 1]);
    translate([14, 11, 1]) color("brown") cube([1, 1, 1]);
    translate([14, 11, 2]) color("brown") cube([1, 1, 1]);
    translate([14, 12, 0]) color("brown") cube([1, 1, 1]);
    translate([14, 12, 1]) color("brown") cube([1, 1, 1]);
    translate([14, 12, 2]) color("brown") cube([1, 1, 1]);
    translate([14, 13, 0]) color("brown") cube([1, 1, 1]);
    translate([14, 13, 1]) color("brown") cube([1, 1, 1]);
    translate([14, 13, 2]) color("brown") cube([1, 1, 1]);
    translate([14, 14, 0]) color("brown") cube([1, 1, 1]);
    translate([14, 14, 1]) color("brown") cube([1, 1, 1]);
    translate([14, 14, 2]) color("brown") cube([1, 1, 1]);
    translate([14, 15, 0]) color("brown") cube([1, 1, 1]);
    translate([14, 15, 1]) color("brown") cube([1, 1, 1]);
    translate([14, 15, 2]) color("brown") cube([1, 1, 1]);
    translate([15, 0, 0]) color("brown") cube([1, 1, 1]);
    translate([15, 0, 1]) color("brown") cube([1, 1, 1]);
    translate([15, 0, 2]) color("brown") cube([1, 1, 1]);
    translate([15, 1, 0]) color("brown") cube([1, 1, 1]);
    translate([15, 1, 1]) color("brown") cube([1, 1, 1]);
    translate([15, 1, 2]) color("brown") cube([1, 1, 1]);
    translate([15, 2, 0]) color("brown") cube([1, 1, 1]);
    translate([15, 2, 1]) color("brown") cube([1, 1, 1]);
    translate([15, 2, 2]) color("brown") cube([1, 1, 1]);
    translate([15, 3, 0]) color("brown") cube([1, 1, 1]);
    translate([15, 3, 1]) color("brown") cube([1, 1, 1]);
    translate([15, 3, 2]) color("brown") cube([1, 1, 1]);
    translate([15, 4, 0]) color("brown") cube([1, 1, 1]);
    translate([15, 4, 1]) color("brown") cube([1, 1, 1]);
    translate([15, 4, 2]) color("brown") cube([1, 1, 1]);
    translate([15, 5, 0]) color("brown") cube([1, 1, 1]);
    translate([15, 5, 1]) color("brown") cube([1, 1, 1]);
    translate([15, 5, 2]) color("brown") cube([1, 1, 1]);
    translate([15, 6, 0]) color("brown") cube([1, 1, 1]);
    translate([15, 6, 1]) color("brown") cube([1, 1, 1]);
    translate([15, 6, 2]) color("brown") cube([1, 1, 1]);
    translate([15, 7, 0]) color("brown") cube([1, 1, 1]);
    translate([15, 7, 1]) color("brown") cube([1, 1, 1]);
    translate([15, 7, 2]) color("brown") cube([1, 1, 1]);
    translate([15, 8, 0]) color("brown") cube([1, 1, 1]);
    translate([15, 8, 1]) color("brown") cube([1, 1, 1]);
    translate([15, 8, 2]) color("brown") cube([1, 1, 1]);
    translate([15, 9, 0]) color("brown") cube([1, 1, 1]);
    translate([15, 9, 1]) color("brown") cube([1, 1, 1]);
    translate([15, 9, 2]) color("brown") cube([1, 1, 1]);
    translate([15, 10, 0]) color("brown") cube([1, 1, 1]);
    translate([15, 10, 1]) color("brown") cube([1, 1, 1]);
    translate([15, 10, 2]) color("brown") cube([1, 1, 1]);
    translate([15, 11, 0]) color("brown") cube([1, 1, 1]);
    translate([15, 11, 1]) color("brown") cube([1, 1, 1]);
    translate([15, 11, 2]) color("brown") cube([1, 1, 1]);
    translate([15, 12, 0]) color("brown") cube([1, 1, 1]);
    translate([15, 12, 1]) color("brown") cube([1, 1, 1]);
    translate([15, 12, 2]) color("brown") cube([1, 1, 1]);
    translate([15, 13, 0]) color("brown") cube([1, 1, 1]);
    translate([15, 13, 1]) color("brown") cube([1, 1, 1]);
    translate([15, 13, 2]) color("brown") cube([1, 1, 1]);
    translate([15, 14, 0]) color("brown") cube([1, 1, 1]);
    translate([15, 14, 1]) color("brown") cube([1, 1, 1]);
    translate([15, 14, 2]) color("brown") cube([1, 1, 1]);
    translate([15, 15, 0]) color("brown") cube([1, 1, 1]);
    translate([15, 15, 1]) color("brown") cube([1, 1, 1]);
    translate([15, 15, 2]) color("brown") cube([1, 1, 1]);
}
